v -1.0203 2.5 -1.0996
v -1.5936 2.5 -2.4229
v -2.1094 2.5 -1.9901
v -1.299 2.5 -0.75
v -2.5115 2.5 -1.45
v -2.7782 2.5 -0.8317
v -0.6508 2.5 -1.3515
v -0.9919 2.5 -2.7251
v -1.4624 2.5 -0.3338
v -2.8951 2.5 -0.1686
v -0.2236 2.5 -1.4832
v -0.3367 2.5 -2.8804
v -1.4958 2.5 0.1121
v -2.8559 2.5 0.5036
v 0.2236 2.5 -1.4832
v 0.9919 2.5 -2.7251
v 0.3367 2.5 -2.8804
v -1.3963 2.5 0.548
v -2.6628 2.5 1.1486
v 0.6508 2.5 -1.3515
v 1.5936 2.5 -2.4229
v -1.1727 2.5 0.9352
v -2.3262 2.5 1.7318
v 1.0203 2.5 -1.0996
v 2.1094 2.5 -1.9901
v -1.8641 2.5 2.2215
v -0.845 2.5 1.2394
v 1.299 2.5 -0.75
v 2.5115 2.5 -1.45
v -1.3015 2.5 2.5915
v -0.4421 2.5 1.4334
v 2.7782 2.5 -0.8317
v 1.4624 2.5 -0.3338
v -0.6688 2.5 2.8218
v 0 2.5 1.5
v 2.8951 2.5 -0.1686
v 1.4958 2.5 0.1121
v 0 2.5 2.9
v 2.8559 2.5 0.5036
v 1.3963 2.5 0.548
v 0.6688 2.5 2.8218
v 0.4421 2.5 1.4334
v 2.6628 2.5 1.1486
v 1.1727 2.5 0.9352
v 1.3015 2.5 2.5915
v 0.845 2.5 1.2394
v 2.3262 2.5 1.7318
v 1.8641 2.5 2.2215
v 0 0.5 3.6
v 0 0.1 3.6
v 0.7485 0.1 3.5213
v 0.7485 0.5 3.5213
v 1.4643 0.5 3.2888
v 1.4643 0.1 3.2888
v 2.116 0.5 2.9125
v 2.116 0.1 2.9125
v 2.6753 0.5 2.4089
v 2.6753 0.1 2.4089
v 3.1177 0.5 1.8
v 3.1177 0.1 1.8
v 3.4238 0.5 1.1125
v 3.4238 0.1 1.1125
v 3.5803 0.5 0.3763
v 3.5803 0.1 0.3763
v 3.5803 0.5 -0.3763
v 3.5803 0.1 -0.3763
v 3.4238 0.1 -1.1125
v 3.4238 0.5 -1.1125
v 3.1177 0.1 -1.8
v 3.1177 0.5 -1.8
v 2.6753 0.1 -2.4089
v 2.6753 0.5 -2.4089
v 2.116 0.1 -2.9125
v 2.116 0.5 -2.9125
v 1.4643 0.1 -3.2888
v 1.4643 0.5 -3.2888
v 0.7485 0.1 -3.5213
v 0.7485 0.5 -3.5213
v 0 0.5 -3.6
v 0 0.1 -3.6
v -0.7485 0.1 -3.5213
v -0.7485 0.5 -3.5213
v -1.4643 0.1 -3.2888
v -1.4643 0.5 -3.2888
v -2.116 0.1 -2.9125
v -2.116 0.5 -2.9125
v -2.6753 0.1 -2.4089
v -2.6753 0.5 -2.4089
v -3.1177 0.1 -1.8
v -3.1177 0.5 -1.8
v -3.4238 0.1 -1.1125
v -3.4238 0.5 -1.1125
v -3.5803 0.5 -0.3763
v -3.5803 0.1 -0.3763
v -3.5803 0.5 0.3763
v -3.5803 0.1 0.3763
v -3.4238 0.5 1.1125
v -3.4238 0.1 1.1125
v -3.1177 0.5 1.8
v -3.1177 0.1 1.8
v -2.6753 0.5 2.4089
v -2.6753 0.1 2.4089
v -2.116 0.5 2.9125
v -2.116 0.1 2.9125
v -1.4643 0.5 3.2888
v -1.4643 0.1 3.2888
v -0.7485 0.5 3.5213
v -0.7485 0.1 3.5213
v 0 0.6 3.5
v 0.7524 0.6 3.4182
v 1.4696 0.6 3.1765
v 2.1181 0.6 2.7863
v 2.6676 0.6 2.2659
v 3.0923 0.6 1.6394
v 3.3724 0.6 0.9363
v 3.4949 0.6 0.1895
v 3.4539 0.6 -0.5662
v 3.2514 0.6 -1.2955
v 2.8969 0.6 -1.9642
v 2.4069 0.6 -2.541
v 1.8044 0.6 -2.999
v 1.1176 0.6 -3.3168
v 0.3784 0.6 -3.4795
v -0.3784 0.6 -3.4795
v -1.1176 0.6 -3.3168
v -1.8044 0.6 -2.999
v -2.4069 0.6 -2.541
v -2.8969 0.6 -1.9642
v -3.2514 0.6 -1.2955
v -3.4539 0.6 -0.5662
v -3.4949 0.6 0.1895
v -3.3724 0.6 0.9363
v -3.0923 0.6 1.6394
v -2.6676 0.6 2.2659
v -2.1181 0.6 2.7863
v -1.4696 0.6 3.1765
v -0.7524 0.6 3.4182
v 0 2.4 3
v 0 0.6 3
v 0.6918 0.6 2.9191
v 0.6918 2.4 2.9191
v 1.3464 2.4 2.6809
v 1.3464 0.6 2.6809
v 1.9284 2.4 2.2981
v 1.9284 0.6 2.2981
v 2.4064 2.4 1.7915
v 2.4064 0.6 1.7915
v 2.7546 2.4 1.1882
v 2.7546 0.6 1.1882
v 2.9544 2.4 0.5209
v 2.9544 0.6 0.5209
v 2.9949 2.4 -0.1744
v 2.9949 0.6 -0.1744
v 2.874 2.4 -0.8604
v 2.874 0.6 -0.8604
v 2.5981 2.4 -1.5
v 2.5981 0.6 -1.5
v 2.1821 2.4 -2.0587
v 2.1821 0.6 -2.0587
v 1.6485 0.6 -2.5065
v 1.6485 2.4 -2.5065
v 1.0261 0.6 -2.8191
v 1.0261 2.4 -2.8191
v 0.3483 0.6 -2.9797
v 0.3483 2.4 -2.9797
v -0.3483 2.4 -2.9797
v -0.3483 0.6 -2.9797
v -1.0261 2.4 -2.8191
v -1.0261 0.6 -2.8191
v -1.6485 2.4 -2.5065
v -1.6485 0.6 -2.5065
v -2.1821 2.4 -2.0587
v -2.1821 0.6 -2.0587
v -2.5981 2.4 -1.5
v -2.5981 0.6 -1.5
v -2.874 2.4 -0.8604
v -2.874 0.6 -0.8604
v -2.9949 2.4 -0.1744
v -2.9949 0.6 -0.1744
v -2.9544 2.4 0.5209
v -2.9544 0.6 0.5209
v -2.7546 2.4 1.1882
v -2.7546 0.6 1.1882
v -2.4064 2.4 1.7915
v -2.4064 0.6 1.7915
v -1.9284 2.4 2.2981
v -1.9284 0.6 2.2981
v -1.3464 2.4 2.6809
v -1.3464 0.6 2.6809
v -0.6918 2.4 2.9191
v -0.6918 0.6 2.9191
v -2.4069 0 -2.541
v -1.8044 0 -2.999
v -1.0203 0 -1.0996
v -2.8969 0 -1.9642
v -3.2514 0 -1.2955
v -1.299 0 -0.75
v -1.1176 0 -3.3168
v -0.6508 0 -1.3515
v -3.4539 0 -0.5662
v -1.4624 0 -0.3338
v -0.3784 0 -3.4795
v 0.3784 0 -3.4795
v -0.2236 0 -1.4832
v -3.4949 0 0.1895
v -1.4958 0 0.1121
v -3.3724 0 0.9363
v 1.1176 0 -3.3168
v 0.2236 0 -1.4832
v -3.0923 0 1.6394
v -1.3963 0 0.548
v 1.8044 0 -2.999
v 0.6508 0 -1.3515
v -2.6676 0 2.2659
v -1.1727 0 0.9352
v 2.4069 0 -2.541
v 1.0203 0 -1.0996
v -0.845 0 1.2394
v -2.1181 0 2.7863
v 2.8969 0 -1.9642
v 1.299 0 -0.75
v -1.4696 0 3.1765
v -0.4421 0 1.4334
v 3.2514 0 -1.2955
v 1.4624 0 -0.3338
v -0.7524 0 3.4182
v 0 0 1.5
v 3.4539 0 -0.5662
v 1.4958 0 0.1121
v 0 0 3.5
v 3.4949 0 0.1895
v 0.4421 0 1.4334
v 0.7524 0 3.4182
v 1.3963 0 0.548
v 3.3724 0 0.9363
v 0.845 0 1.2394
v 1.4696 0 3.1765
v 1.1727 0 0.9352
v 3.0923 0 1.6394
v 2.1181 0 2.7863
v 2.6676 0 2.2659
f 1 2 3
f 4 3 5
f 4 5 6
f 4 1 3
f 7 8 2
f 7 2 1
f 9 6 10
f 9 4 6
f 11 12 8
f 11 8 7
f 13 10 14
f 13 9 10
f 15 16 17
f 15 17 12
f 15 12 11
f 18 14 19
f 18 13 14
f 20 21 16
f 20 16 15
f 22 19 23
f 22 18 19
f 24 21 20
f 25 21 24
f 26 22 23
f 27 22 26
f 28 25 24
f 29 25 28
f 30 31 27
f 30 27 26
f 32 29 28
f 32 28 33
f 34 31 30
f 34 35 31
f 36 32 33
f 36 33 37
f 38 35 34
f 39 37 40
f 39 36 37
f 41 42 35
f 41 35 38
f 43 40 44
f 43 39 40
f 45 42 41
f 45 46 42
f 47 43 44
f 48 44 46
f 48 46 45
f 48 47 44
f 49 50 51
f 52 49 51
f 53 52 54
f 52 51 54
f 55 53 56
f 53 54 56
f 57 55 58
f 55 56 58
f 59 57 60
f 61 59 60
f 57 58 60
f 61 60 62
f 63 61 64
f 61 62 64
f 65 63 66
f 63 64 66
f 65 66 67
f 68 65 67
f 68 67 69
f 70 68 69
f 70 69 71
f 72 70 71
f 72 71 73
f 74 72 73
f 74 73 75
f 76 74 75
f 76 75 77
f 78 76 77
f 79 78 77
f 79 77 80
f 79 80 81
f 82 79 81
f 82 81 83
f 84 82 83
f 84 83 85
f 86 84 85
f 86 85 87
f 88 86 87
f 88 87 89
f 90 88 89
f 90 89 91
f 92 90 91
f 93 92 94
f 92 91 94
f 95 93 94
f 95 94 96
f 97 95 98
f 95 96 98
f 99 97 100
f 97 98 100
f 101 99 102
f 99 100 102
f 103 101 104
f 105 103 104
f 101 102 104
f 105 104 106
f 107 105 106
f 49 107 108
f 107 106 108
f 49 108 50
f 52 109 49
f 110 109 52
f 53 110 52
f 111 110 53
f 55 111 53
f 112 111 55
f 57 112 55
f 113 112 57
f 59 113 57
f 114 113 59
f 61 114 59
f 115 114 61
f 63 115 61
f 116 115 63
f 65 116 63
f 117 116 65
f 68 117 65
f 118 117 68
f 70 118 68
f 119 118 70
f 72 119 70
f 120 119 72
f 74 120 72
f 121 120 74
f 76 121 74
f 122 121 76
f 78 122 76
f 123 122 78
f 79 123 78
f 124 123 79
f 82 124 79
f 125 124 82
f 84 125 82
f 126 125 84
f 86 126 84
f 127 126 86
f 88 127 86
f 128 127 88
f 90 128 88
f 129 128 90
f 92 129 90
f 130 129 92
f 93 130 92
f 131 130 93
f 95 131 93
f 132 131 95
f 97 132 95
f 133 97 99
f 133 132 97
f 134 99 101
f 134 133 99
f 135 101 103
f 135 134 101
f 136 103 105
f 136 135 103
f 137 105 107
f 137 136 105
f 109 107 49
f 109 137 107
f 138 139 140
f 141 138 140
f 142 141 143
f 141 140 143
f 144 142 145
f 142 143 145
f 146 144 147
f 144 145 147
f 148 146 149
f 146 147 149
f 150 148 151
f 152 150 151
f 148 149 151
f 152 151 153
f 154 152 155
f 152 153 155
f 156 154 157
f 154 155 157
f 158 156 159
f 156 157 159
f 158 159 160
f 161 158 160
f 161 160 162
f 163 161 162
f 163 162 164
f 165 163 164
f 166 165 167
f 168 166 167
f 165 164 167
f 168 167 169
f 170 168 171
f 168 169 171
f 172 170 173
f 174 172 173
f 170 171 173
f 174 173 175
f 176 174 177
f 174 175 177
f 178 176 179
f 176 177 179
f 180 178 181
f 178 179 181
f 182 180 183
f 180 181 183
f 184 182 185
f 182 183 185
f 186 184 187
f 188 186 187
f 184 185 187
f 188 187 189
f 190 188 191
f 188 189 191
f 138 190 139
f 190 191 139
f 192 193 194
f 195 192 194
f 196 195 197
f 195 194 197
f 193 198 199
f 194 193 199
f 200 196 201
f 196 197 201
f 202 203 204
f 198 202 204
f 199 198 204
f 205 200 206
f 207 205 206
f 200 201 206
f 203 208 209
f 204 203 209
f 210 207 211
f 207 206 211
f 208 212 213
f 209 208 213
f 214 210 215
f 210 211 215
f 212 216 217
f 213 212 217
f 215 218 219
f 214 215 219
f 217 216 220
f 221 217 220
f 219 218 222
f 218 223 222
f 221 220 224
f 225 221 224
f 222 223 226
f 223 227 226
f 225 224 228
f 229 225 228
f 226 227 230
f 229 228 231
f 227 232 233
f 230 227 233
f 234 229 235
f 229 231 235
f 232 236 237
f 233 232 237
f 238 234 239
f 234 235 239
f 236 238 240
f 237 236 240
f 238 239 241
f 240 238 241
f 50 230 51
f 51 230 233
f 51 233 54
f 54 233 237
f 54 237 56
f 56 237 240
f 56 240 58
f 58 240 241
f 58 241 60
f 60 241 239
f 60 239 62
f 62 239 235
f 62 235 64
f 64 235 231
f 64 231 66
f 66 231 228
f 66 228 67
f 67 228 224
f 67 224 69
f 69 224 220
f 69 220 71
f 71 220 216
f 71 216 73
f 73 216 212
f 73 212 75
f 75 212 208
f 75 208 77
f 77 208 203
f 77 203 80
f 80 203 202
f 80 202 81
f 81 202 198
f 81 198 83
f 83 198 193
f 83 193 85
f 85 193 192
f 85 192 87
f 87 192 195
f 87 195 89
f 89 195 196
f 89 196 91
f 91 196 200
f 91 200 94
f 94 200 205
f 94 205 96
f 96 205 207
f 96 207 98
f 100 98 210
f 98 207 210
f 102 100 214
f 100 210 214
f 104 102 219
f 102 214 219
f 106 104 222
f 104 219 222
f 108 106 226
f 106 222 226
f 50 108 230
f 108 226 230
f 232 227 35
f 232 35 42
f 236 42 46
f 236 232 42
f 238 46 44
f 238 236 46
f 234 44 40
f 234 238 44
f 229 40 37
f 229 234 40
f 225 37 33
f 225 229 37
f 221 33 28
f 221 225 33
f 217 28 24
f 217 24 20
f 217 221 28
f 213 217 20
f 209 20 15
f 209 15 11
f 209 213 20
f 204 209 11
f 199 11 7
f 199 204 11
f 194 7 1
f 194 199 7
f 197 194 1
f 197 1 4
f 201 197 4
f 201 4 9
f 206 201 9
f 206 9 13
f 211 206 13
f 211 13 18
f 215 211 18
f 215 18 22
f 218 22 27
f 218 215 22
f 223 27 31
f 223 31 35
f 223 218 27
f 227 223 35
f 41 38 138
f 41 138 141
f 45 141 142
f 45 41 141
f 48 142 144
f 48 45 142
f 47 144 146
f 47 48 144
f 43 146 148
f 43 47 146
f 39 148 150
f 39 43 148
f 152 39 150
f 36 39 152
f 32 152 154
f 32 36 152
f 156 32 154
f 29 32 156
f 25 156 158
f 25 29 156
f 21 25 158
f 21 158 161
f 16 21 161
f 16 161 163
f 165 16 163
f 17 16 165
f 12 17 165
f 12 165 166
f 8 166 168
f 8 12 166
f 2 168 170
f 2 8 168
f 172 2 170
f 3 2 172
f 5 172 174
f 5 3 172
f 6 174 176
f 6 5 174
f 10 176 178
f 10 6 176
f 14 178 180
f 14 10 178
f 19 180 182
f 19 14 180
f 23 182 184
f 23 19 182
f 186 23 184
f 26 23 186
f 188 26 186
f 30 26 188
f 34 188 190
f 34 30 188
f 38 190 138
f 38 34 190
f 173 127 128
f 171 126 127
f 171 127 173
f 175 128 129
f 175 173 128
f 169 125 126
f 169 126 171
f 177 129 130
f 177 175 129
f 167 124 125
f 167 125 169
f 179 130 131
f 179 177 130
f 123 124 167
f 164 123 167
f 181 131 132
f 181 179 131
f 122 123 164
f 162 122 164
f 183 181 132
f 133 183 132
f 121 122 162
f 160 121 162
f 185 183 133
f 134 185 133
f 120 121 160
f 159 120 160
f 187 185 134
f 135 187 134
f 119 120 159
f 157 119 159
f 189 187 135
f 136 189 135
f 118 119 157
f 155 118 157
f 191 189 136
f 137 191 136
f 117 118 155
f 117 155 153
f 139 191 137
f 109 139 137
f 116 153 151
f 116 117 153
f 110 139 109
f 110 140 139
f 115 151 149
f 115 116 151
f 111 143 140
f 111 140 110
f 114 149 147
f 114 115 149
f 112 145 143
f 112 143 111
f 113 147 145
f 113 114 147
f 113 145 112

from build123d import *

# Parameters (mm, degrees)
SKETCH_1_R          = 3.6
SKETCH_1_R_2        = 1.5
EXTRUDE_1_DEPTH     = 2.5
CUT_EXTRUDE_START   = -1.9
SKETCH_2_R          = 3.6
SKETCH_2_R_2        = 3
CUT_EXTRUDE_1_DEPTH = 1.9
CHAMFER_1_SIZE      = 0.1


with BuildPart() as part:
    # 草图1 → 凸台-拉伸1 (new body)
    with BuildSketch(Plane(origin=(0, 0, 0), x_dir=(1, 0, 0), z_dir=(0, 1, 0))):
        with Locations(Location((0, 0, 0), (0, 0, 270))):
            Circle(SKETCH_1_R)
        with Locations(Location((0, 0, 0), (0, 0, 270))):
            Circle(SKETCH_1_R_2, mode=Mode.SUBTRACT)
    extrude(amount=EXTRUDE_1_DEPTH)

    # 草图2 → 切除-拉伸1 (cut)
    with BuildSketch(Plane(origin=(0, 2.5, 0), x_dir=(1, 0, 0), z_dir=(0, 1, 0)).offset(CUT_EXTRUDE_START)):
        with Locations(Location((0, 0, 0), (0, 0, 270))):
            Circle(SKETCH_2_R)
        with Locations(Location((0, 0, 0), (0, 0, 270))):
            Circle(SKETCH_2_R_2, mode=Mode.SUBTRACT)
    extrude(amount=CUT_EXTRUDE_1_DEPTH, mode=Mode.SUBTRACT)

    # 倒角1
    chamfer_1_edges = [part.edges().sort_by_distance(p)[0] for p in [
        (0, 0.6, -3.6),
        (0, 2.5, -3),
        (0, 0, -3.6),
    ]]
    chamfer(chamfer_1_edges, length=CHAMFER_1_SIZE)


solid = part.part
